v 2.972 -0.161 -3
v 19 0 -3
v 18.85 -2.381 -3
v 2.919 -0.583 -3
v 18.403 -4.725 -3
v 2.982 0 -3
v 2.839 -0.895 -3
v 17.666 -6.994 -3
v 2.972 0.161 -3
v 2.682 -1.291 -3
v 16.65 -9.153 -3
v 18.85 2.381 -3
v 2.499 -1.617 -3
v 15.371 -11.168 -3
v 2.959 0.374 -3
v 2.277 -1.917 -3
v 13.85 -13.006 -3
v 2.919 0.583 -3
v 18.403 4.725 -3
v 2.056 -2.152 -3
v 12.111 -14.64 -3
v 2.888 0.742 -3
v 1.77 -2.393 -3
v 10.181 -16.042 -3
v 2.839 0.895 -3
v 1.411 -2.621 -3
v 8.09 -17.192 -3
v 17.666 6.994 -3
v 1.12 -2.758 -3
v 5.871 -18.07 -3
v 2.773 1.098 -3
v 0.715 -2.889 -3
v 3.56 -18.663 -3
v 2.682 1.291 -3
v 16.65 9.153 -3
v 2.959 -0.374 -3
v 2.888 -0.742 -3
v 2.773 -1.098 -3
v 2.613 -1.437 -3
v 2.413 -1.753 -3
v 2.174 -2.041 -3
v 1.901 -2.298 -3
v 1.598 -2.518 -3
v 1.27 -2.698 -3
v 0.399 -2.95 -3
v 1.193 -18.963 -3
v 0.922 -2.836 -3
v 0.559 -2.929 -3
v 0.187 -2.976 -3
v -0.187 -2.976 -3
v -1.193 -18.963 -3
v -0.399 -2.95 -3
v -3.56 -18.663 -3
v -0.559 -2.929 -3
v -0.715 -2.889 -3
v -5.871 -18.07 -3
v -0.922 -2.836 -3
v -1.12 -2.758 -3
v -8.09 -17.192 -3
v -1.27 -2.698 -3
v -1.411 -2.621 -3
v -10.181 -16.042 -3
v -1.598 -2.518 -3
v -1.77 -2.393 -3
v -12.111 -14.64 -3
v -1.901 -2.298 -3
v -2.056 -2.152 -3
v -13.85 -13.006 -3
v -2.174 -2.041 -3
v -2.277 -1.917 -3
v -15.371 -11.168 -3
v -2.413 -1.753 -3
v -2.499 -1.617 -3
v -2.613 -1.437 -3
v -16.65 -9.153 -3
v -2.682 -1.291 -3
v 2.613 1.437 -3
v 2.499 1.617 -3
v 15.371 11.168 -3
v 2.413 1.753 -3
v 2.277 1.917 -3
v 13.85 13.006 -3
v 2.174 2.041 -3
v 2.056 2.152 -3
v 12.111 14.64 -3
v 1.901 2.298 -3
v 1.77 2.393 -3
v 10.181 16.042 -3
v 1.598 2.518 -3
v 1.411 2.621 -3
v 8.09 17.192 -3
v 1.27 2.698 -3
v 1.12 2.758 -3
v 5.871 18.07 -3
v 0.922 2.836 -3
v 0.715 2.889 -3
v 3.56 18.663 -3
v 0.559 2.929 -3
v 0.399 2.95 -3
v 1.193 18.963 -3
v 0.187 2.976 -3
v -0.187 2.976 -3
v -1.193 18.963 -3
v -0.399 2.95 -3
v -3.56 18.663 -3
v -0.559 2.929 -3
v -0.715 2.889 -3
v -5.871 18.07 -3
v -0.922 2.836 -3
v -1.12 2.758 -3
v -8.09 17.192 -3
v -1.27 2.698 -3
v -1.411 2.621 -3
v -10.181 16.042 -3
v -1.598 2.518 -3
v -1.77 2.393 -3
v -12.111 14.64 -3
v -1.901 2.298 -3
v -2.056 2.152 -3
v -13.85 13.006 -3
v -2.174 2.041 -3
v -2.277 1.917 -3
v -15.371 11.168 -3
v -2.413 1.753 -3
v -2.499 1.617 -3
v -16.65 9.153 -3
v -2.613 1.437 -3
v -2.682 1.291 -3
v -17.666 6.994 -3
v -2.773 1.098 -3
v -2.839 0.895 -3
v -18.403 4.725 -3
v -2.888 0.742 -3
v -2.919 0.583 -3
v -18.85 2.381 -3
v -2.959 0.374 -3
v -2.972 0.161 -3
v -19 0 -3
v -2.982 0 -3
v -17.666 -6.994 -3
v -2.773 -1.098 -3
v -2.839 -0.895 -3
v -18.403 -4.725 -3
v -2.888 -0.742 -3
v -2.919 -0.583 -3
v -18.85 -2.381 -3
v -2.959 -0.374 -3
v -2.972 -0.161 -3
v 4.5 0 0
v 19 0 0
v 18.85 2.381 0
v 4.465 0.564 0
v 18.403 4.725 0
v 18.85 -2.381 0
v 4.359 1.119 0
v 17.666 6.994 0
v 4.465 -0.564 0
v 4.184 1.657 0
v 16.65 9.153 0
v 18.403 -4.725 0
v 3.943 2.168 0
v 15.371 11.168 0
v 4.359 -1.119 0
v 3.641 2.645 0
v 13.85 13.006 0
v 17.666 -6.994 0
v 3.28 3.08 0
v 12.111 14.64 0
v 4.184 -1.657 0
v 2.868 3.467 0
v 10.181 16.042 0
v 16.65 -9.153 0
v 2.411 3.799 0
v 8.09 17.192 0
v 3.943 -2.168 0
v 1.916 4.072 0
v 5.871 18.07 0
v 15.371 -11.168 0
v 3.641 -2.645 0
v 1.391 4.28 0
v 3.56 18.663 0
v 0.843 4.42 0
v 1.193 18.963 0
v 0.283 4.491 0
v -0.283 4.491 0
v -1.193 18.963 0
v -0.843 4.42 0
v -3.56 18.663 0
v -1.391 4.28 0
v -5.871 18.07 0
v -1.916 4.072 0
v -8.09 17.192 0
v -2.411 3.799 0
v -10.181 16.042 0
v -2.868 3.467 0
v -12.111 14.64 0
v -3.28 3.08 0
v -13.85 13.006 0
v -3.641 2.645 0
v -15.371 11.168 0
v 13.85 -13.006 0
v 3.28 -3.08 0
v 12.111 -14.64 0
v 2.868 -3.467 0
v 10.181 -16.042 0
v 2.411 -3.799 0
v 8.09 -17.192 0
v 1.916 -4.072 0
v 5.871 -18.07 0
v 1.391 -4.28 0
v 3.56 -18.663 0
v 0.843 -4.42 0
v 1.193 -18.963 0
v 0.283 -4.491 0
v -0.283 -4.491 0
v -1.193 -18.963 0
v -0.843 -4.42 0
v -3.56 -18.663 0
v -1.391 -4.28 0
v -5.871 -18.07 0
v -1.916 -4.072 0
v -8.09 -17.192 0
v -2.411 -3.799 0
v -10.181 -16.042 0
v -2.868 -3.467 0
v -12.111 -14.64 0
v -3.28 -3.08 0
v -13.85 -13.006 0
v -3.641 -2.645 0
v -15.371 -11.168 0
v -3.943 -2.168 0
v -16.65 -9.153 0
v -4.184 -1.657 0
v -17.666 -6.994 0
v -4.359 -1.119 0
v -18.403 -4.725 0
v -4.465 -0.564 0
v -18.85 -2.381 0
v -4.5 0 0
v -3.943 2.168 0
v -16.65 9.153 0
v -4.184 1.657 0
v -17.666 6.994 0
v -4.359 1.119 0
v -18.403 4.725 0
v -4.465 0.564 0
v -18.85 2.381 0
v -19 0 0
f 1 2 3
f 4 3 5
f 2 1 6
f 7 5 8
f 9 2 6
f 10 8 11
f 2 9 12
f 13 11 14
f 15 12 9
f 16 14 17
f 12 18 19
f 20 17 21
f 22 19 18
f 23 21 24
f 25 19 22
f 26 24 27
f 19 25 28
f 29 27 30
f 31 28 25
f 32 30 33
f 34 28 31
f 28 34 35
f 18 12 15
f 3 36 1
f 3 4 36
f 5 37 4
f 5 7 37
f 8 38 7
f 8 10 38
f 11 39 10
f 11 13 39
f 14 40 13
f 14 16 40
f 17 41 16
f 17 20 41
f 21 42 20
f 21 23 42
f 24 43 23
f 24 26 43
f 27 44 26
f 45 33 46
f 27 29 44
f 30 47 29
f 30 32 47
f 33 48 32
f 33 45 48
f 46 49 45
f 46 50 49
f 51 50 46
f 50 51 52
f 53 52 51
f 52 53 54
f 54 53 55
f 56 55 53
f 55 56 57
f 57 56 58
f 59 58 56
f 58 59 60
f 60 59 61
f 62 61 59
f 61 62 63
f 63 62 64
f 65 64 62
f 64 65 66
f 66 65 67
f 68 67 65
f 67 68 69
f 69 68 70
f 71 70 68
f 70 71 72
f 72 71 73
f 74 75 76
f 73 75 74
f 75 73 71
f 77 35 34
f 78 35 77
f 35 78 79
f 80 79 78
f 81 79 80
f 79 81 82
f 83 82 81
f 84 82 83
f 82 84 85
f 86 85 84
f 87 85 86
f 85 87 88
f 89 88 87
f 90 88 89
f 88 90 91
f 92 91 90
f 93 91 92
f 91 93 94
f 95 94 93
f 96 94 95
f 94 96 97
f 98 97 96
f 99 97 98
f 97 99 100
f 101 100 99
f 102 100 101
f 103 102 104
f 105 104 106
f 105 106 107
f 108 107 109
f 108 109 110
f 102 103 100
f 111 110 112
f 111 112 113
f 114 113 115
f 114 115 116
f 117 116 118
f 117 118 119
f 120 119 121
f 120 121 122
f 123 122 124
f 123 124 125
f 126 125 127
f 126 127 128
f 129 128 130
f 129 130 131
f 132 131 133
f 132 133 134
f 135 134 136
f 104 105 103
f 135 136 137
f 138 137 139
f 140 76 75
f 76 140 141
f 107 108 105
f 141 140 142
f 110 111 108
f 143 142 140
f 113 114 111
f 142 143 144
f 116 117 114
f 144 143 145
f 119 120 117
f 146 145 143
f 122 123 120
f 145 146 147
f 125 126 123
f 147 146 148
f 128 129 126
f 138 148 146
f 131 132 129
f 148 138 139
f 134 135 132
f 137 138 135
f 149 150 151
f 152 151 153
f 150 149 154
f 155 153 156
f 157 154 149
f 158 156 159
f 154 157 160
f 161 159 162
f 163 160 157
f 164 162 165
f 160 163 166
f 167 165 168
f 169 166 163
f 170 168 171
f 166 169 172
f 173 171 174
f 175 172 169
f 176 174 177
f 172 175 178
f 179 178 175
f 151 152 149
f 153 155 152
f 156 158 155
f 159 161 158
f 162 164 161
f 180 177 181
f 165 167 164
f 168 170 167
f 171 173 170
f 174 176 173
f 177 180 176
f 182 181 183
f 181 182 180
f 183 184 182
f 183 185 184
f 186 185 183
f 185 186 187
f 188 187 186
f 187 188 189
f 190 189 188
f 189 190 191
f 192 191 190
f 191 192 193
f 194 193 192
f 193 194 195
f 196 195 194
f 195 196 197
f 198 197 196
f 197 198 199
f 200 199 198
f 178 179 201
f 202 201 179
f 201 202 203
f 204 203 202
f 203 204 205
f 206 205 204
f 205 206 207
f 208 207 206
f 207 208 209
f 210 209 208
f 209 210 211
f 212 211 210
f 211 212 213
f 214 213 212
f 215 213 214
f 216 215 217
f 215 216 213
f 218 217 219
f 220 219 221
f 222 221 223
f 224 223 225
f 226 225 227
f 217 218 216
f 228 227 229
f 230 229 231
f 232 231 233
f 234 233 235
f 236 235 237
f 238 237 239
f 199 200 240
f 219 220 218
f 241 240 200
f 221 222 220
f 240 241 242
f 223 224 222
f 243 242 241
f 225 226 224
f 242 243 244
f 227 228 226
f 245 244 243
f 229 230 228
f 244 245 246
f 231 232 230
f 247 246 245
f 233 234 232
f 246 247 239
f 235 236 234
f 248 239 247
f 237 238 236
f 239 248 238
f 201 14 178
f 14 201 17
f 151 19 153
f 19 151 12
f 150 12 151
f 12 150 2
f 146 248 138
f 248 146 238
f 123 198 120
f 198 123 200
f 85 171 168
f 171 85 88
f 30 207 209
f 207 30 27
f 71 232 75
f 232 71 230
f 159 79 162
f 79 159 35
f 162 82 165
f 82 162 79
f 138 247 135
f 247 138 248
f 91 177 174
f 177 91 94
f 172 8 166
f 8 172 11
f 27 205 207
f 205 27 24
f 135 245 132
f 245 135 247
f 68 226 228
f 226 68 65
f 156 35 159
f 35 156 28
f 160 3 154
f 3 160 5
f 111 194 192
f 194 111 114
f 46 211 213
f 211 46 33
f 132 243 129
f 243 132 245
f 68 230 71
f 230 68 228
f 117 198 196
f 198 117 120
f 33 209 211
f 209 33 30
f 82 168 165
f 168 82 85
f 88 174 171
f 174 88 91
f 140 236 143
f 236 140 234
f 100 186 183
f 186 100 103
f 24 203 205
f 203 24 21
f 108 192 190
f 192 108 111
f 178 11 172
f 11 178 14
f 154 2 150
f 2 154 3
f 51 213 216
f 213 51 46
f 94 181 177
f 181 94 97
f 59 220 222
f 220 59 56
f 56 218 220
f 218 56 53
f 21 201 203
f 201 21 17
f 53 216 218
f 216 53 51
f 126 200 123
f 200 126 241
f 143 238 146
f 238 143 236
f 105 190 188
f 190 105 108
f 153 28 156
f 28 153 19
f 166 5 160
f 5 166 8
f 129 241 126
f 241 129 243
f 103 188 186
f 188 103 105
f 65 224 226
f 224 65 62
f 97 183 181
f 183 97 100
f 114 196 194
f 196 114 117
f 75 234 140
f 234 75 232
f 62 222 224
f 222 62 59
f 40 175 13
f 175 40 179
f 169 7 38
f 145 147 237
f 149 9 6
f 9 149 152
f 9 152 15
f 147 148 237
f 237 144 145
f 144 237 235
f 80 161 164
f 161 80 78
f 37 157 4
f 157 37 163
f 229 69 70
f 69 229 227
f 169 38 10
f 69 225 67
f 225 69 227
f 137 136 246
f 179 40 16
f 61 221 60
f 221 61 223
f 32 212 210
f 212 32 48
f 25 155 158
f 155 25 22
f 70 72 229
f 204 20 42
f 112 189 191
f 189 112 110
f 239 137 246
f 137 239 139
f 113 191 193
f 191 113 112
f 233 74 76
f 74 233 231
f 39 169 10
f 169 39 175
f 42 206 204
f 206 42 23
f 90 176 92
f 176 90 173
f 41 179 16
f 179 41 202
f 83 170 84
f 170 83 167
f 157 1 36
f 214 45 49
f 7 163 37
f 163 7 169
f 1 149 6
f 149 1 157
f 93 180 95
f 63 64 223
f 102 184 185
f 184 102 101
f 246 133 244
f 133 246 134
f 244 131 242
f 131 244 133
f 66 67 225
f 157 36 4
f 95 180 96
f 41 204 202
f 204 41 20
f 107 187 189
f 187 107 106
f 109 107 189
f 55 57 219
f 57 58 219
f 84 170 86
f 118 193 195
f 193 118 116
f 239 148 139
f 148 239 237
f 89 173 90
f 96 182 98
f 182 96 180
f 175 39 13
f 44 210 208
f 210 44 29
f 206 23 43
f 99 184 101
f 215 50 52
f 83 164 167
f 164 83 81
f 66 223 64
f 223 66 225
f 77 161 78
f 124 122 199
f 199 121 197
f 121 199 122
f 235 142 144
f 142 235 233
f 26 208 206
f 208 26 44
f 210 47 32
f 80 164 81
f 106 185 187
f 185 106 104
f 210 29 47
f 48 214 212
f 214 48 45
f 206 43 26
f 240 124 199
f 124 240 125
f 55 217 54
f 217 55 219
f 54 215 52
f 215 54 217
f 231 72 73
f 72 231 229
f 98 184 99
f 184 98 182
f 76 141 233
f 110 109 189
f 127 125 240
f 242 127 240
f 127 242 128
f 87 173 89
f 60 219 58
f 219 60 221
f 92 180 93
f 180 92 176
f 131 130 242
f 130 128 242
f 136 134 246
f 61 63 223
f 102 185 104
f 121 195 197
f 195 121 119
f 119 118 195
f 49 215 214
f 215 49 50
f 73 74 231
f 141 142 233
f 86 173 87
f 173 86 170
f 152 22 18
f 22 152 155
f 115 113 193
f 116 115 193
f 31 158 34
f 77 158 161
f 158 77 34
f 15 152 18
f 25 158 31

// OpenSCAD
$fn = 50;


difference() {
	union() {
		translate(v = [0, 0, -3.0000000000]) {
			cylinder(h = 3, r = 10.0000000000);
		}
		translate(v = [0, 0, -3.0000000000]) {
			cylinder(h = 3, r = 19.0000000000);
		}
	}
	union() {
		translate(v = [0, 0, 0]) {
			rotate(a = [0, 0, 0]) {
				difference() {
					union() {
						#translate(v = [0, 0, -3.0000000000]) {
							cylinder(h = 3, r = 2.2500000000);
						}
						#translate(v = [0, 0, -4.2000000000]) {
							cylinder(h = 4.2000000000, r = 10.0000000000, r1 = 2.3750000000, r2 = 4.5000000000);
						}
						#translate(v = [0, 0, -3.0000000000]) {
							cylinder(h = 3, r = 2.3750000000);
						}
						#translate(v = [0, 0, -3.0000000000]) {
							cylinder(h = 3, r = 2.2500000000);
						}
					}
					union();
				}
			}
		}
	}
}
